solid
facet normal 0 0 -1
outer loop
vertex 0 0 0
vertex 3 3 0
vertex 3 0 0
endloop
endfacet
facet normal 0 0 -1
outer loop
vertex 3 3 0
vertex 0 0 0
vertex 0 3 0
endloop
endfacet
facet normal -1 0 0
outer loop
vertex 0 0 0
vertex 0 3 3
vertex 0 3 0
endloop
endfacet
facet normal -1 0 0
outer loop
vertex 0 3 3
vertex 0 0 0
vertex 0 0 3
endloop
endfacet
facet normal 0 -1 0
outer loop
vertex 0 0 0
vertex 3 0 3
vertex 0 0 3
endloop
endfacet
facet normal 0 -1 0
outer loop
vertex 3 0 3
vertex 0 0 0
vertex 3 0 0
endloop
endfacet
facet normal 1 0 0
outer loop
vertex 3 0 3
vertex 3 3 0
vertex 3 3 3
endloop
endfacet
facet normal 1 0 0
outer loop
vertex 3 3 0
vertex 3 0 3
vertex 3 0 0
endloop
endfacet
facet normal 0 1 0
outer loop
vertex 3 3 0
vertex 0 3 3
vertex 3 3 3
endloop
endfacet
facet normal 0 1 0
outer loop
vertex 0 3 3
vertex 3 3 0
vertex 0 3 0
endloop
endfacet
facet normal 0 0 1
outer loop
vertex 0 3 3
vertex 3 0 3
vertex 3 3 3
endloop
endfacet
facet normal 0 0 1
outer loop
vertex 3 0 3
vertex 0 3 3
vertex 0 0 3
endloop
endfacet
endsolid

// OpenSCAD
subcubex=1;
subcubey=1;
subcubez=1;

// make a cube of cubes
for (k=[0:2], z_shift=k*subcubez){
    for (j=[0:2], y_shift=j*subcubey){
        for (i=[0:2], x_shift=i*subcubex){
            translate([x_shift, y_shift, z_shift]) cube([subcubex, subcubey, subcubez]);
        }
    }
}
